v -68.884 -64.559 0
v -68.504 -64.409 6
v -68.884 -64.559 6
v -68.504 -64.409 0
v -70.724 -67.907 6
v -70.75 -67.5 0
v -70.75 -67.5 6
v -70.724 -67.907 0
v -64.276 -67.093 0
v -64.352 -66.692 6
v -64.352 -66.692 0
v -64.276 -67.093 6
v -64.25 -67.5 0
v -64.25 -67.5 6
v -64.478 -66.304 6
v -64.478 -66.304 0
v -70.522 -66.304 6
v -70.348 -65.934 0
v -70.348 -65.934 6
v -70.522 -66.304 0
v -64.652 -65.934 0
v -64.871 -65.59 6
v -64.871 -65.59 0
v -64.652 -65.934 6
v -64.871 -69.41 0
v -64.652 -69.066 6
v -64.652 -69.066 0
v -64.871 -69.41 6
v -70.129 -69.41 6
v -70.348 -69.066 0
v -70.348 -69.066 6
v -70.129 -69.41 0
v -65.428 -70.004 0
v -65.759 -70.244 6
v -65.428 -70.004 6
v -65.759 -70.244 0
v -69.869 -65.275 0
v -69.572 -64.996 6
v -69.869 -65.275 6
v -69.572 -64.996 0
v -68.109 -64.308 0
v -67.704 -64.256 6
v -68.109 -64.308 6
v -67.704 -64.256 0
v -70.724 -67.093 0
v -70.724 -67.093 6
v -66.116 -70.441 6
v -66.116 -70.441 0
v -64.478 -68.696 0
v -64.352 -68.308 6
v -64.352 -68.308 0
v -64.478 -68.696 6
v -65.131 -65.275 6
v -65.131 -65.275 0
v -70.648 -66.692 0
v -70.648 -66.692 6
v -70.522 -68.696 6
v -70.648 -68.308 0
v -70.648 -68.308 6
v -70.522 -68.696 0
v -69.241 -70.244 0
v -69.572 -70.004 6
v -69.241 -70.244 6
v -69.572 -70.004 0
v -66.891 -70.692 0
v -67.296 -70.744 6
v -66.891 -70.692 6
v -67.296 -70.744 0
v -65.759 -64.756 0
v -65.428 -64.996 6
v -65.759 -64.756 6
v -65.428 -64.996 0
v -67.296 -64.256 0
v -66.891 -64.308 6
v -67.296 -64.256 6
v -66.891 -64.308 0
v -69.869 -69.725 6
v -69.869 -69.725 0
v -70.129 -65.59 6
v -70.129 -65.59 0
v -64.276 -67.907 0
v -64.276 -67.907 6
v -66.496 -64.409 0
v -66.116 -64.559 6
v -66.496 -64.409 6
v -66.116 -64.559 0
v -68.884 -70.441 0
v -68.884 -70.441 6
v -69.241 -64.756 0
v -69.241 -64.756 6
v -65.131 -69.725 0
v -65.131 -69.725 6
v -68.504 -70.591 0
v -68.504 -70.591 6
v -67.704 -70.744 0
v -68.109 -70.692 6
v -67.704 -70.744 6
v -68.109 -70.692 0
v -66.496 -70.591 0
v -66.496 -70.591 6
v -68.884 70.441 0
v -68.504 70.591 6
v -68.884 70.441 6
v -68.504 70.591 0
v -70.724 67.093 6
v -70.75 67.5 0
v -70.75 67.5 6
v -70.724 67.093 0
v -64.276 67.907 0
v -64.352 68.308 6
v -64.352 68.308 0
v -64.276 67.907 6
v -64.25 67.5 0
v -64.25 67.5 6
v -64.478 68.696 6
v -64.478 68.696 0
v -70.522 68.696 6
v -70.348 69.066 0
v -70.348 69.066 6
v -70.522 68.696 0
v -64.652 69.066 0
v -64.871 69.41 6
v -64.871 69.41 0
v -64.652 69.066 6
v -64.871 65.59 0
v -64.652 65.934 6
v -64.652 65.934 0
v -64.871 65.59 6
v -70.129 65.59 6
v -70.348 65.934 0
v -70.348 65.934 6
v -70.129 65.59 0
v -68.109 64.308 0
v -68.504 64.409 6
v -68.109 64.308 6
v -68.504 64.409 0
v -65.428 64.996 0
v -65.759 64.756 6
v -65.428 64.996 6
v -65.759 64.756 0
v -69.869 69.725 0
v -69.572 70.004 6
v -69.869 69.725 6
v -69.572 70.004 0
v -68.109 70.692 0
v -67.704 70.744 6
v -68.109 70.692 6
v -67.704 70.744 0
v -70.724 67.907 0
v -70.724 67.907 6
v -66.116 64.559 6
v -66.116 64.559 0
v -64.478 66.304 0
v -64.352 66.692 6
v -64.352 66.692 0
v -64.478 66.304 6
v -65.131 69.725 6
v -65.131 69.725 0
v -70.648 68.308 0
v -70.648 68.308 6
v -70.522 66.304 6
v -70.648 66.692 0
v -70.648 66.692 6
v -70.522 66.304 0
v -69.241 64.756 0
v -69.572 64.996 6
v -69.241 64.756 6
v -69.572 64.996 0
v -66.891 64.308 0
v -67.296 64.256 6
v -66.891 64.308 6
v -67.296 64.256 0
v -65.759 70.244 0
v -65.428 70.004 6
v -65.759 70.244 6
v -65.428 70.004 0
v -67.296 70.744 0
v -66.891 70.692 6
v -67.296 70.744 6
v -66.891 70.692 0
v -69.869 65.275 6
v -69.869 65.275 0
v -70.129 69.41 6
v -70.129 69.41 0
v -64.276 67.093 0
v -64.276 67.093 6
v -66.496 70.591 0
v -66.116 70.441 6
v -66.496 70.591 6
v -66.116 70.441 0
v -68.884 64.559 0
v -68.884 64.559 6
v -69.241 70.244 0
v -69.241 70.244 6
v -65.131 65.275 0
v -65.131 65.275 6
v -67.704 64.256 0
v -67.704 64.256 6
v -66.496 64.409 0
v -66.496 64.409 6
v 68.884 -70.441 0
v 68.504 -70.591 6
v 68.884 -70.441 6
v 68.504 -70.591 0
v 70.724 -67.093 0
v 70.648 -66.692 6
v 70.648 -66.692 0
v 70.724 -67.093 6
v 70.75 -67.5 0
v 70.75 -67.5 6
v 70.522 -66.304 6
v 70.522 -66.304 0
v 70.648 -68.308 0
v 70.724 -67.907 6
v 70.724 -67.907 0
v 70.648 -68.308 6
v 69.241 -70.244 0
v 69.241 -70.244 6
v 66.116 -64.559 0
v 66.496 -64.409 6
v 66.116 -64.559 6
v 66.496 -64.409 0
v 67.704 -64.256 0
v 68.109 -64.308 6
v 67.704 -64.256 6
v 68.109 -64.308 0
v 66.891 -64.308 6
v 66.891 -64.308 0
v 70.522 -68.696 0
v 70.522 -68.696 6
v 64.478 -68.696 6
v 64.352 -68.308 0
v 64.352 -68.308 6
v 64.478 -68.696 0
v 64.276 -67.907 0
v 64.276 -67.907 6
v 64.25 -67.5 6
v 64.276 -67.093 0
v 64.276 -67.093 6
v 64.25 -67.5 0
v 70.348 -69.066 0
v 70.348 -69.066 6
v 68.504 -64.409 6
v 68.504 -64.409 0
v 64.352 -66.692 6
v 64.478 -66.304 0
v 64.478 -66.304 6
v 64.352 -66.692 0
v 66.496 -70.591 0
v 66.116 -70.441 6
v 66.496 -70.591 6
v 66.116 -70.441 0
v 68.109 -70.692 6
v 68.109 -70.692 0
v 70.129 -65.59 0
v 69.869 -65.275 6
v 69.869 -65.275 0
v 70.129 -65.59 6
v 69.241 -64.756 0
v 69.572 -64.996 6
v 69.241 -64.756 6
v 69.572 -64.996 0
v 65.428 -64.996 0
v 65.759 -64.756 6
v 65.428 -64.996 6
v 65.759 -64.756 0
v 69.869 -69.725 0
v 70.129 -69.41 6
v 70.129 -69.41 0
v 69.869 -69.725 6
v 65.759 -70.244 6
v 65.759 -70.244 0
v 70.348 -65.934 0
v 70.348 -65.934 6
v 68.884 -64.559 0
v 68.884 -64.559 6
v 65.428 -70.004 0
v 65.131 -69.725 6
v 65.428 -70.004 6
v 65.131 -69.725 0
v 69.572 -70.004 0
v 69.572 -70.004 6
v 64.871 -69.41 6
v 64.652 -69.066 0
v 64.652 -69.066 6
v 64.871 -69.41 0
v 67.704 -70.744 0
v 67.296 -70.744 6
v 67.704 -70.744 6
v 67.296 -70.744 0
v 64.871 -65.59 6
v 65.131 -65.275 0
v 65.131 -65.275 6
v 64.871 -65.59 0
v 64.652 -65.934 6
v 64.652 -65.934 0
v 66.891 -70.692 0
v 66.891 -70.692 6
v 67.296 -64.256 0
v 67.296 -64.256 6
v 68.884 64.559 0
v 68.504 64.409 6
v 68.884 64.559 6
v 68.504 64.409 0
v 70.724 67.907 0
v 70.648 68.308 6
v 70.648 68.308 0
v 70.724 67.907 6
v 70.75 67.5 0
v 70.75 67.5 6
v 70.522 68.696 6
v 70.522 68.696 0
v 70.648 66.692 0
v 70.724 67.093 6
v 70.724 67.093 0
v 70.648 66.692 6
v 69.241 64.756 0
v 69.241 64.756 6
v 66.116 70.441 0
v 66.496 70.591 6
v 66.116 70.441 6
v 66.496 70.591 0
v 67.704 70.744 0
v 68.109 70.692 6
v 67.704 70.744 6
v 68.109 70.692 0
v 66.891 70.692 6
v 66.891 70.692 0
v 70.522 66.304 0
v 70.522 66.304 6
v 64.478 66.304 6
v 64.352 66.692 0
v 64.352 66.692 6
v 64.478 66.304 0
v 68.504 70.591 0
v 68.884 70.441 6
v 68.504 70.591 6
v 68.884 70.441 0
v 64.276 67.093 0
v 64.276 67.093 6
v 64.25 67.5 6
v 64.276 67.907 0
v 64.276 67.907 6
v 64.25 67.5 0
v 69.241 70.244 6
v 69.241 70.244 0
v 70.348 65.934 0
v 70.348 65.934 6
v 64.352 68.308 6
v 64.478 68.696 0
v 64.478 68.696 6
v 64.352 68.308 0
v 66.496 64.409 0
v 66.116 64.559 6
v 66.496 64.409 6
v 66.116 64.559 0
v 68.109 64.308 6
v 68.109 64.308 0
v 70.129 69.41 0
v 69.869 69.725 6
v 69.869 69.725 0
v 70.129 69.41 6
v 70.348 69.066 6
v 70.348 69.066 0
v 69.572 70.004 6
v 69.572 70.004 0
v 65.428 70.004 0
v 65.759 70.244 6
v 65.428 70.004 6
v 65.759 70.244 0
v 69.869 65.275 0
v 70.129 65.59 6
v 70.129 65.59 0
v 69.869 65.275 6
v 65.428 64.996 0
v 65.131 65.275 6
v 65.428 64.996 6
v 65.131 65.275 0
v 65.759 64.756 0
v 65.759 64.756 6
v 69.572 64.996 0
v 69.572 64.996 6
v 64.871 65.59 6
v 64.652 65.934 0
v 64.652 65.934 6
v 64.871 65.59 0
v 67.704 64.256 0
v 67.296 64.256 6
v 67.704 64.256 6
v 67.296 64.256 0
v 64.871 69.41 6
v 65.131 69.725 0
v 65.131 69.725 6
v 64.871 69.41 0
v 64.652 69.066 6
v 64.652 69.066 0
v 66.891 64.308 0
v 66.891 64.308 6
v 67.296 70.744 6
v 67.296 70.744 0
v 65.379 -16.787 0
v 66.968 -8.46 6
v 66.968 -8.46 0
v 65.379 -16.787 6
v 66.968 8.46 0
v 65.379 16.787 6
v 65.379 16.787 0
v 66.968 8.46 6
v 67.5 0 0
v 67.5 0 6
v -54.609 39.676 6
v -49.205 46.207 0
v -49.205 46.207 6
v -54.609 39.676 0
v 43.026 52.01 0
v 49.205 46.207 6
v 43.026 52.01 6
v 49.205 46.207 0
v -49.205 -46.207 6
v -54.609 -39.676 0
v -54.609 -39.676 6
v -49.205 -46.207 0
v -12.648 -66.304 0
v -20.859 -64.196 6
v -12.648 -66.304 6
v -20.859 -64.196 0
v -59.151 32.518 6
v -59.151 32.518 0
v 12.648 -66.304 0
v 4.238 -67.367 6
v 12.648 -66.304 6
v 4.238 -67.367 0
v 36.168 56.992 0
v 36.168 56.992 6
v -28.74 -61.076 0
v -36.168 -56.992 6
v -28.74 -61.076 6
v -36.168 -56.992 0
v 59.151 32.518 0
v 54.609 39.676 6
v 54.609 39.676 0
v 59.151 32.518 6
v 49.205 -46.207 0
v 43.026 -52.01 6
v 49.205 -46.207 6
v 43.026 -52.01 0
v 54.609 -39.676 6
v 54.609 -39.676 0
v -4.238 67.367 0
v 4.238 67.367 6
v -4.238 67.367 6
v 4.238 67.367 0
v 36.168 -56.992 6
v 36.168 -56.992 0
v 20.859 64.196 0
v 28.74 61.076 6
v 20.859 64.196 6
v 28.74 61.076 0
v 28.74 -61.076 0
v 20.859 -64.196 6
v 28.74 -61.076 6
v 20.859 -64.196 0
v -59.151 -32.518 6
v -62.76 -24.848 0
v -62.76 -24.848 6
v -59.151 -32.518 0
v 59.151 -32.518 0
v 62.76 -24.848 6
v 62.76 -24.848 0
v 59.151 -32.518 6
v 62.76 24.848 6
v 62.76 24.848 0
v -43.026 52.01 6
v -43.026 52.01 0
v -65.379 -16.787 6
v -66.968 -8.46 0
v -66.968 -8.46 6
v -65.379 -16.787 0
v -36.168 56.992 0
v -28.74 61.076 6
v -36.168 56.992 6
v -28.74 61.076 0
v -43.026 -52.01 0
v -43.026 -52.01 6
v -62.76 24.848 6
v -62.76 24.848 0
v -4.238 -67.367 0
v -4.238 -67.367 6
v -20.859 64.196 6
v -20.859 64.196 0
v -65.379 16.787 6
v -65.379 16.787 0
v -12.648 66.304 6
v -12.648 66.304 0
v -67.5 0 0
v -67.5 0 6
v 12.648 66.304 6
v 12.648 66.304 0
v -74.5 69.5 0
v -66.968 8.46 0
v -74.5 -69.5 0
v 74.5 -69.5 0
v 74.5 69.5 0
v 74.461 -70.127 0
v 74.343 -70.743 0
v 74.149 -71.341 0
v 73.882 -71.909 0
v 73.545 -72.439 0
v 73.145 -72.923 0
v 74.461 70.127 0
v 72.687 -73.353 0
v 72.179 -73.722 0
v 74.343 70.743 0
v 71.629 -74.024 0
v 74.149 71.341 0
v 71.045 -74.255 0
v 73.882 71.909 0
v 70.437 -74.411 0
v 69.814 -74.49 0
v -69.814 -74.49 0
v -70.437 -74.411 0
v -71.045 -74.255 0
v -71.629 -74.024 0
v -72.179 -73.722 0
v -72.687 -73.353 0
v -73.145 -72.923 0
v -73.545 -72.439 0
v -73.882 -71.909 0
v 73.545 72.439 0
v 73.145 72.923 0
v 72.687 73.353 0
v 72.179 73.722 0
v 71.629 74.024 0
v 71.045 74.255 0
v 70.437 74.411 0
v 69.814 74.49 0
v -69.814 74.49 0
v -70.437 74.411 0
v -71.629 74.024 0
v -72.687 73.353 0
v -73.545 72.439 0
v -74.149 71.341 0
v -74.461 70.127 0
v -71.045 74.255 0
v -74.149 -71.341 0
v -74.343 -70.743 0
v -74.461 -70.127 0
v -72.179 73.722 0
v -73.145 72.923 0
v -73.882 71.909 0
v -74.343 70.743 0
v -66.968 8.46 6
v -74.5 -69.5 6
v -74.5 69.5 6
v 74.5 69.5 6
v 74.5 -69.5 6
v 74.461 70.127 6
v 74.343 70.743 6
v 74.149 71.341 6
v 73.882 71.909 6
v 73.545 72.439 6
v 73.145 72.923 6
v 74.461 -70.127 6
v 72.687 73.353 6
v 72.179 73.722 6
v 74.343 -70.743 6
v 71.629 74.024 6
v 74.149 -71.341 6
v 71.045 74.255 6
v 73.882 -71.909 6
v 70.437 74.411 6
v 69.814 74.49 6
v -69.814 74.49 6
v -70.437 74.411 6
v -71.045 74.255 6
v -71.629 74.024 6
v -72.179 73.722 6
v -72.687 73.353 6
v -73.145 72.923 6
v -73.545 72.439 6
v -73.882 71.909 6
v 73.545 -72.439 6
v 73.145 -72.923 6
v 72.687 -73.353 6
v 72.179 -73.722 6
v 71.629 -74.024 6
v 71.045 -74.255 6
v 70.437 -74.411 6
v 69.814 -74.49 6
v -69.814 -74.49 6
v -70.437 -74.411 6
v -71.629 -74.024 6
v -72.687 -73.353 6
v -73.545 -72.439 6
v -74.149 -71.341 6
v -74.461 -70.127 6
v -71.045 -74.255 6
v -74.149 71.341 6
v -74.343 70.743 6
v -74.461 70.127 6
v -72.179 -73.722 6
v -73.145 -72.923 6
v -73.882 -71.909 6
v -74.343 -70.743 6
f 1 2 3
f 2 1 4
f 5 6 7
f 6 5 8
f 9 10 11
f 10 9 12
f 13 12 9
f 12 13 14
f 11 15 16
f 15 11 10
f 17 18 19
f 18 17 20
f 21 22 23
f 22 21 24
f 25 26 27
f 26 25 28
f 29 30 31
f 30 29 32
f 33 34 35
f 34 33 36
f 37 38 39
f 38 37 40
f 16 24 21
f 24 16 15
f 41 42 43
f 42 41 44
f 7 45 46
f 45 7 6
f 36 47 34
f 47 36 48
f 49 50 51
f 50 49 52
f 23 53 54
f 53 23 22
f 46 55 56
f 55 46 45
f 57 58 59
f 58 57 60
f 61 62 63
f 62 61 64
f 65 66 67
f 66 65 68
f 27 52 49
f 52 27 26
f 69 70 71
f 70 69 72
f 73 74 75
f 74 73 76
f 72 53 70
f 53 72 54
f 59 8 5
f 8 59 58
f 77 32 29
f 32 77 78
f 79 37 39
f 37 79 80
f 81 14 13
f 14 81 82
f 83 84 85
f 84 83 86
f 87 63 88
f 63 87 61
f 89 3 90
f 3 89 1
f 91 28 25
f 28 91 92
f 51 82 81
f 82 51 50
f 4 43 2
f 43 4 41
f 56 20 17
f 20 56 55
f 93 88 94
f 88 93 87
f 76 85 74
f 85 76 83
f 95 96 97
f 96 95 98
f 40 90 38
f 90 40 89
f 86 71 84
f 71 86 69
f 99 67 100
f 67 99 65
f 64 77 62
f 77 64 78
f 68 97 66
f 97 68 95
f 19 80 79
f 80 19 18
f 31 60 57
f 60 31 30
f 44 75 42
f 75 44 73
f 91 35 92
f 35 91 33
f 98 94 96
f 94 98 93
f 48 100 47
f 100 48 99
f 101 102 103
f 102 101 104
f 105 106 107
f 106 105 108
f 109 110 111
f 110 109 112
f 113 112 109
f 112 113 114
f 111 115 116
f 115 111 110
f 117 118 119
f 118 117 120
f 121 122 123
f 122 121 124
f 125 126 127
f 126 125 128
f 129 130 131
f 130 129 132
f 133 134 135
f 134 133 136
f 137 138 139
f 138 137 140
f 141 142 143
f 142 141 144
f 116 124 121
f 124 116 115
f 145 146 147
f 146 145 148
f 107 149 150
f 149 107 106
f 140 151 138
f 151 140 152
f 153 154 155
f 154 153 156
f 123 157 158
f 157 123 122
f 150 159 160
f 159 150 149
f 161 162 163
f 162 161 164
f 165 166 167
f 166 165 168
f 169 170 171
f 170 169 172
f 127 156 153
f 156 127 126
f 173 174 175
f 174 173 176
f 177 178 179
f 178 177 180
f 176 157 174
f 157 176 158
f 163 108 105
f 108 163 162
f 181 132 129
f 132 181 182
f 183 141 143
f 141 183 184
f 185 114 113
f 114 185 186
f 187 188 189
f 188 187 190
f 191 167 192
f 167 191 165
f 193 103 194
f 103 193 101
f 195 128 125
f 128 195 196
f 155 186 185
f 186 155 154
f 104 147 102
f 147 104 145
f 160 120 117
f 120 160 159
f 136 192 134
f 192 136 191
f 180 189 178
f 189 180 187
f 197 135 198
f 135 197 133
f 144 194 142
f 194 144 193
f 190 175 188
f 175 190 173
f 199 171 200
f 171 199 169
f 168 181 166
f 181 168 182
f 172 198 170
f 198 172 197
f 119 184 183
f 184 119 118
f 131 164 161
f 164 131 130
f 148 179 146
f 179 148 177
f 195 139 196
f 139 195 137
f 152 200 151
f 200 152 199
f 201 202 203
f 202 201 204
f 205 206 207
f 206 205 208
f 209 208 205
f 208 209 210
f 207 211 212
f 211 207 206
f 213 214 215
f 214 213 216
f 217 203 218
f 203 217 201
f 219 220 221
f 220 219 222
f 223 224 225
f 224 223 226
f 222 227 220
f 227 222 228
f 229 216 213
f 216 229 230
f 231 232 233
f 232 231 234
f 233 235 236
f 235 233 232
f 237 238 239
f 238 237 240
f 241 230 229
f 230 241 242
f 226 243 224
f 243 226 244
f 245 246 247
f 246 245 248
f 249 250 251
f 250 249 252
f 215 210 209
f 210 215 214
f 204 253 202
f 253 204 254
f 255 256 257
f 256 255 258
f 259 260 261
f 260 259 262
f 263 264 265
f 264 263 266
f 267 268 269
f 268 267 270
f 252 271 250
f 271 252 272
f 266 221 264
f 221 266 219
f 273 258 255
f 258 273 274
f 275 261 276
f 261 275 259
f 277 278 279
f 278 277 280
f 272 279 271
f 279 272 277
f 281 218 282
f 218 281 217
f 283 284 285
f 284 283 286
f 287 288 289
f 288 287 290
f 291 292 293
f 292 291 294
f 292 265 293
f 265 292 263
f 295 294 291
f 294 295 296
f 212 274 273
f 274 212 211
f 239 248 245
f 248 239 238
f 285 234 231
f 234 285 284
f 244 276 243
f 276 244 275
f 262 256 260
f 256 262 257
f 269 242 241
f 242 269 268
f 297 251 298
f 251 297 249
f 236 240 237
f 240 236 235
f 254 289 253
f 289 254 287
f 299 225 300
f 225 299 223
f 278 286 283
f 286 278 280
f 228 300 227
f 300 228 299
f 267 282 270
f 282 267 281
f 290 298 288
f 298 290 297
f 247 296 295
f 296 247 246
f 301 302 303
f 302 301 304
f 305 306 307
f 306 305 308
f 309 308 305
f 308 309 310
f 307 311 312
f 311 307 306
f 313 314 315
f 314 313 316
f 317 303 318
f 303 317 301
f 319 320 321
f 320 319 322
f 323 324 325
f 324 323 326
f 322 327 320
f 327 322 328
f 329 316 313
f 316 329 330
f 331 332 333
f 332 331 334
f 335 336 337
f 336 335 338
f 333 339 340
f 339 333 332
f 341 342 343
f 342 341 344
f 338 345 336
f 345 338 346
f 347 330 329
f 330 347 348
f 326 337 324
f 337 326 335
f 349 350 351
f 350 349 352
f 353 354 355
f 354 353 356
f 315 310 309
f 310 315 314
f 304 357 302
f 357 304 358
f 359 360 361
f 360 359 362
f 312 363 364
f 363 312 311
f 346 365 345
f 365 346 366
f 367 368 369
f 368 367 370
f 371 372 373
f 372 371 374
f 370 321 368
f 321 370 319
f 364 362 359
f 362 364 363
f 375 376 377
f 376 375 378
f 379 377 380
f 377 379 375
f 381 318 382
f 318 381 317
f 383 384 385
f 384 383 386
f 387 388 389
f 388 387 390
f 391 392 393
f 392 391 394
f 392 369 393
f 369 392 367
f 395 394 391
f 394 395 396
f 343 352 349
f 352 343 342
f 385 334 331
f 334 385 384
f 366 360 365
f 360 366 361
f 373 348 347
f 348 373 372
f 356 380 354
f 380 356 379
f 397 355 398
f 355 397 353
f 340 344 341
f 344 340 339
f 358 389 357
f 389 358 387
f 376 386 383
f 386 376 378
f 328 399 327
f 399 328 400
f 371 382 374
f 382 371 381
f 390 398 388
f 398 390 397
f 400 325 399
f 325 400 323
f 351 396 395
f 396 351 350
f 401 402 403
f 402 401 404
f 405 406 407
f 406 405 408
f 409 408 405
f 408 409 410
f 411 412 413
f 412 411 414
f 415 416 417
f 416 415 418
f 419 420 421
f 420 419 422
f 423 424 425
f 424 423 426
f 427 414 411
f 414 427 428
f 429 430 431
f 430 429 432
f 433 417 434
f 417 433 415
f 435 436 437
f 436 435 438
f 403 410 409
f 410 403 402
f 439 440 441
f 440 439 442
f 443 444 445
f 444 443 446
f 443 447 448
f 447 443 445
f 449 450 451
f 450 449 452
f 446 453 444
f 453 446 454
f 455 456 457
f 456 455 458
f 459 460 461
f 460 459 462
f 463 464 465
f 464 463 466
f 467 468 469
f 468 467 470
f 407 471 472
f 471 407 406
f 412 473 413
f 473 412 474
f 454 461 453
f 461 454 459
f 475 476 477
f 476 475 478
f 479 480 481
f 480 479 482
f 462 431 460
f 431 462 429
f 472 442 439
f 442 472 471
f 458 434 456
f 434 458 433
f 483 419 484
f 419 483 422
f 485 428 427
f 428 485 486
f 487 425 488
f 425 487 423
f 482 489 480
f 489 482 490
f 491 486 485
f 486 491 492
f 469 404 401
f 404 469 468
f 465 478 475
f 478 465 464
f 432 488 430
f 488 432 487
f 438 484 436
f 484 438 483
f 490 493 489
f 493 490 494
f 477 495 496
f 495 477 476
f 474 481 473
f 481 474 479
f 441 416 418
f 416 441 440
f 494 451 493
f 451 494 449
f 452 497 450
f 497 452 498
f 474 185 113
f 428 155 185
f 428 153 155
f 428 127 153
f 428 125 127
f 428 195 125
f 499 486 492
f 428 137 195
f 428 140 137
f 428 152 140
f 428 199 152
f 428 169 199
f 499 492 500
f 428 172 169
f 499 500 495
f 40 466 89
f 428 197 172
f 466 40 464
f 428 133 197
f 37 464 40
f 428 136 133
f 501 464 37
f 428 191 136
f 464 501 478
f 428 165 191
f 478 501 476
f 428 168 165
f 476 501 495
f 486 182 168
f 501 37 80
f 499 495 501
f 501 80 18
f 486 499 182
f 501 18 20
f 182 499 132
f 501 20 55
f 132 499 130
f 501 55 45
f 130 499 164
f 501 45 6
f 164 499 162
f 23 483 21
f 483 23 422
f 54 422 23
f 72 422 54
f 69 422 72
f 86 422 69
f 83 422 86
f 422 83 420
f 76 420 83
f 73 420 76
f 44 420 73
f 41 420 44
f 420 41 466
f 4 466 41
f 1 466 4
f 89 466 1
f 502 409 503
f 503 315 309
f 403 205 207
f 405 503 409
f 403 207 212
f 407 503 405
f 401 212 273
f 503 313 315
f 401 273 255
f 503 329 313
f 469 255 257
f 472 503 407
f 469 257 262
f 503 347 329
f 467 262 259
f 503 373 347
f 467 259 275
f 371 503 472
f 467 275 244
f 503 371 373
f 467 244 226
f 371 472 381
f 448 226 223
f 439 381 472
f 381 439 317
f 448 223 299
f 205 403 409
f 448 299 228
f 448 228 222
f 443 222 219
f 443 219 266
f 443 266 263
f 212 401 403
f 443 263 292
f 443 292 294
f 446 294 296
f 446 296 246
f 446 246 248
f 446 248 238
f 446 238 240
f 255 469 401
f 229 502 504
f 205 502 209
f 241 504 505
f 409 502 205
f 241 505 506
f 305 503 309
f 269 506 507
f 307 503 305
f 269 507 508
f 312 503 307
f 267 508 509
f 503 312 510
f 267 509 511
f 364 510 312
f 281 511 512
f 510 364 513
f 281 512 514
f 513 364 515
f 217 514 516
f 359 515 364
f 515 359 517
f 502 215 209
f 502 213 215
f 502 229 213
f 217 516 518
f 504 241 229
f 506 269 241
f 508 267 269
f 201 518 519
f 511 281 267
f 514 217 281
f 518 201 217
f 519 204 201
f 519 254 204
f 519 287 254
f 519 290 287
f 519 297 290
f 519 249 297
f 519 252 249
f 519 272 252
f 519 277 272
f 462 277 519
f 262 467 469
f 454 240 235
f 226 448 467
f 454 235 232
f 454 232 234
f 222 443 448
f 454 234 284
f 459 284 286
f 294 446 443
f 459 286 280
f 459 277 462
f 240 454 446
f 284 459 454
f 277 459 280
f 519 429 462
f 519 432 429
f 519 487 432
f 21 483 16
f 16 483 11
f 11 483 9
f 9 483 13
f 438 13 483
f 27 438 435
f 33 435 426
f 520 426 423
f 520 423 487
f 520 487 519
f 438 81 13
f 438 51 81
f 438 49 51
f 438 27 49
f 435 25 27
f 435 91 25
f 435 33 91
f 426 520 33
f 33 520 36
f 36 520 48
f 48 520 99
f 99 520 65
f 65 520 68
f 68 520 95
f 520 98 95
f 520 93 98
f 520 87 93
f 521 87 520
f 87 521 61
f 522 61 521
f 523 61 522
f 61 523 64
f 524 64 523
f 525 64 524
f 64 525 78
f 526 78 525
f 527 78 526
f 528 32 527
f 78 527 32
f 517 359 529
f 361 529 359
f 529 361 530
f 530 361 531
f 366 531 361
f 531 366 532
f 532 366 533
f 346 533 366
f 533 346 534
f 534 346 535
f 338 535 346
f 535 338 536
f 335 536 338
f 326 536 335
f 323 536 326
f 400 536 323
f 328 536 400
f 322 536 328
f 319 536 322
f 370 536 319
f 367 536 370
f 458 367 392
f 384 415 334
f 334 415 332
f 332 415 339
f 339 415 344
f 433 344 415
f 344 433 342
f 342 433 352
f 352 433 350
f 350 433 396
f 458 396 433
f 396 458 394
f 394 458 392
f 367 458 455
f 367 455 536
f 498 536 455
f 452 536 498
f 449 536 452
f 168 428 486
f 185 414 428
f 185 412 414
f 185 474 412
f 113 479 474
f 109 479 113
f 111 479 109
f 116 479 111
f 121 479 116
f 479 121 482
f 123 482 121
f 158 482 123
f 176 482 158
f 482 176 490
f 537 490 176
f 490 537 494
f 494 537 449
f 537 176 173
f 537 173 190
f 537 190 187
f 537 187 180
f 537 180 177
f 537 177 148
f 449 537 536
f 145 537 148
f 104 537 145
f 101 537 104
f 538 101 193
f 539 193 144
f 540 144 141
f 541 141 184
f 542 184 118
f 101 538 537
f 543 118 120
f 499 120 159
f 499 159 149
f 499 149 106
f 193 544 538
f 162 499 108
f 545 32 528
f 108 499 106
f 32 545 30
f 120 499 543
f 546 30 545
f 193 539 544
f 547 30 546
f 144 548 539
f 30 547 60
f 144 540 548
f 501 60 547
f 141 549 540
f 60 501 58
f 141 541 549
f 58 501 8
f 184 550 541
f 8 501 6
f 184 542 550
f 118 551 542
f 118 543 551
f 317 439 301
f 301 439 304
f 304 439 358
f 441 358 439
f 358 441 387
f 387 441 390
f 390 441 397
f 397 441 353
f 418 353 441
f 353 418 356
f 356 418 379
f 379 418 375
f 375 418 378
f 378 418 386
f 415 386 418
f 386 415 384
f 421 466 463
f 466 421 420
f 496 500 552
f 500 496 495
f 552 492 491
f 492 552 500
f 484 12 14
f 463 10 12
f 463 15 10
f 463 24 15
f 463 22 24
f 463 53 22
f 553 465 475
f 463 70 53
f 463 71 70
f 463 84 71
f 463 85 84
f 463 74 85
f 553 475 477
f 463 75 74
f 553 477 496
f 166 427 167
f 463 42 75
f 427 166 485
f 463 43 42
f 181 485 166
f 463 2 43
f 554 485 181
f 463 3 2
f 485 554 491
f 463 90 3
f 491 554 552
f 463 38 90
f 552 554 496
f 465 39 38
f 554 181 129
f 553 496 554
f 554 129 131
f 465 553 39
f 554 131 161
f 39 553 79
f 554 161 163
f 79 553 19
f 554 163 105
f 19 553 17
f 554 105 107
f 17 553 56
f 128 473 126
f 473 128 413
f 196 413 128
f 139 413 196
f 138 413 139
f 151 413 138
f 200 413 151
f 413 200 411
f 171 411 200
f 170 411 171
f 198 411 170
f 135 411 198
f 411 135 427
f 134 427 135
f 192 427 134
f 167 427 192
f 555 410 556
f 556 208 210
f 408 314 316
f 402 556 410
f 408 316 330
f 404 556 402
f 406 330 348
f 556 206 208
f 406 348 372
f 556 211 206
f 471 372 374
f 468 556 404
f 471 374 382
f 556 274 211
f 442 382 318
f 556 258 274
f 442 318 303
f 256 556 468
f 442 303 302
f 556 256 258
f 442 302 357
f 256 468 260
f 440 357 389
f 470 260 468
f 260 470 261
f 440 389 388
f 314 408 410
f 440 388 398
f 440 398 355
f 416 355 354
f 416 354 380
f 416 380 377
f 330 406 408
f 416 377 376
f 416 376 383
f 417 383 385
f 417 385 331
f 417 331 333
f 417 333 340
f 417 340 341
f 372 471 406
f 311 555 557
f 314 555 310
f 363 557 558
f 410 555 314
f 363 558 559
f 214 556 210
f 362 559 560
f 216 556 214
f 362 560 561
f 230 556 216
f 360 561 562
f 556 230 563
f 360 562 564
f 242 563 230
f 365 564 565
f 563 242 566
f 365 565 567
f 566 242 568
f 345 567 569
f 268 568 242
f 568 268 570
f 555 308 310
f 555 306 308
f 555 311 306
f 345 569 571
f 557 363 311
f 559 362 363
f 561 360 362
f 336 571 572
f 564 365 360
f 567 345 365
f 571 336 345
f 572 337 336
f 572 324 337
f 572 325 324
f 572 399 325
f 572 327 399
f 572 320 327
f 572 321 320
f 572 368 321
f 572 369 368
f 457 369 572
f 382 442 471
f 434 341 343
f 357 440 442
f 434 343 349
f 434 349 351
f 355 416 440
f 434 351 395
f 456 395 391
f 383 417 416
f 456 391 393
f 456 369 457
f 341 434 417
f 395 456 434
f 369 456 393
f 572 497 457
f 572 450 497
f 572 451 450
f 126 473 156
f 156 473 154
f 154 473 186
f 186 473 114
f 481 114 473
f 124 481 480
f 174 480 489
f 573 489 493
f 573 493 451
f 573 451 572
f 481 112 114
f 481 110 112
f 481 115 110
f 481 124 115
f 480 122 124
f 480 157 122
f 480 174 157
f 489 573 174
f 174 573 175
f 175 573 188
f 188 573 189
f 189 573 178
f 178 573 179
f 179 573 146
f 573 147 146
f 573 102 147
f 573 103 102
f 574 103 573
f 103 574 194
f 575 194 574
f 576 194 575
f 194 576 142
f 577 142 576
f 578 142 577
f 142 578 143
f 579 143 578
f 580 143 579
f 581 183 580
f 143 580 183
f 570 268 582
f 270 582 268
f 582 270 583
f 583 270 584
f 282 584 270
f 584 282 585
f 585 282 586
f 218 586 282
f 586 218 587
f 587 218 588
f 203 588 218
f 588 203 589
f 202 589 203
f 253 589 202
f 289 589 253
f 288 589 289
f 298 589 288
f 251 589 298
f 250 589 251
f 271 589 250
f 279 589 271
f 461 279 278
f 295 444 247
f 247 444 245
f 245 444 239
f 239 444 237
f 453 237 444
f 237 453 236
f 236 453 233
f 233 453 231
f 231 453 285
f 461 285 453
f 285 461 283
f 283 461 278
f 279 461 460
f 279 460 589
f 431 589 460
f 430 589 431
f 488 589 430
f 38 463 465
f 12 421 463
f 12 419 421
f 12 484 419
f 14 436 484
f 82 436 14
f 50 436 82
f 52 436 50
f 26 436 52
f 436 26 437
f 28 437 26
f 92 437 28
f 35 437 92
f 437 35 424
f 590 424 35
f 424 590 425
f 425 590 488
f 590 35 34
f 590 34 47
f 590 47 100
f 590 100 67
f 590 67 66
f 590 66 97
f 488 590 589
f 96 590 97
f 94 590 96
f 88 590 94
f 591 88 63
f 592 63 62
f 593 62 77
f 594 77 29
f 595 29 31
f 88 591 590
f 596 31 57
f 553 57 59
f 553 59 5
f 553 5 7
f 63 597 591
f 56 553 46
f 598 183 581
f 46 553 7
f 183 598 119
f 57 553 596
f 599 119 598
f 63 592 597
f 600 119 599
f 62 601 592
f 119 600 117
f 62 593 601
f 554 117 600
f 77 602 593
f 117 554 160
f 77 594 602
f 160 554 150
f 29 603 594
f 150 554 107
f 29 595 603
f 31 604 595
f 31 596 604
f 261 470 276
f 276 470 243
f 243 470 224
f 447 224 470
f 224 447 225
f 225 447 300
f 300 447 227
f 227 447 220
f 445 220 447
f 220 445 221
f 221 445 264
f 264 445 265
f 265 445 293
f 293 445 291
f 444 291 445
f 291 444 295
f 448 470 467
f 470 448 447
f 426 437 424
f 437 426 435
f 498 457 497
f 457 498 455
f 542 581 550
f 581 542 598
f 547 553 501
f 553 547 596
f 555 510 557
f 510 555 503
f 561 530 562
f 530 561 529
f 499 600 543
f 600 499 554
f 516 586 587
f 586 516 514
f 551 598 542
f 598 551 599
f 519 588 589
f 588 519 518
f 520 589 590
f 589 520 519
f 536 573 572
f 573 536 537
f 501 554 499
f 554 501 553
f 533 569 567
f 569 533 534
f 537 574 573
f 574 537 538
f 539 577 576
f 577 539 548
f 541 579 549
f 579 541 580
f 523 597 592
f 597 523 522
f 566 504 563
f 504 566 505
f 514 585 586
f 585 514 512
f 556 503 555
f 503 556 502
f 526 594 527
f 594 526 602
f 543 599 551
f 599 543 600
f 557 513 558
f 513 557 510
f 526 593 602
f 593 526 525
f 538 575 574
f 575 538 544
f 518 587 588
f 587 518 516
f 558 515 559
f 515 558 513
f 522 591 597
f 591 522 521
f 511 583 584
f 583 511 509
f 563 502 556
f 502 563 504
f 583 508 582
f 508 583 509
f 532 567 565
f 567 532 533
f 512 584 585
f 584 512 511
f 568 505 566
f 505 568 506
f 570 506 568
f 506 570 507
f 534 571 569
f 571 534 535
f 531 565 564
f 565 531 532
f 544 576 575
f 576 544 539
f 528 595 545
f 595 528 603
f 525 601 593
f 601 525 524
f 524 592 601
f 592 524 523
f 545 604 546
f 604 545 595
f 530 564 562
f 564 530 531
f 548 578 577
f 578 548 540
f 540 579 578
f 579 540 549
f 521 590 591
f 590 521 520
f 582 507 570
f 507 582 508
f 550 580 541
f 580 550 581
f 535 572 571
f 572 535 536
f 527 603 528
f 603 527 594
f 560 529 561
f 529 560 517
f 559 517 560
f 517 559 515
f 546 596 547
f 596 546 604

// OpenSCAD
$fn = 50;

difference() {
	union() {
		hull() {
			translate(v = [-69.5, 69.5, 0]) {
				cylinder(h = 6, r = 5);
			}
			translate(v = [69.5, 69.5, 0]) {
				cylinder(h = 6, r = 5);
			}
			translate(v = [-69.5, -69.5, 0]) {
				cylinder(h = 6, r = 5);
			}
			translate(v = [69.5, -69.5, 0]) {
				cylinder(h = 6, r = 5);
			}
		}
	}
	union() {
		translate(v = [-67.5, -67.5, -100.0]) {
			cylinder(h = 200, r = 3.25);
		}
		translate(v = [-67.5, 67.5, -100.0]) {
			cylinder(h = 200, r = 3.25);
		}
		translate(v = [67.5, -67.5, -100.0]) {
			cylinder(h = 200, r = 3.25);
		}
		translate(v = [67.5, 67.5, -100.0]) {
			cylinder(h = 200, r = 3.25);
		}
		translate(v = [-67.5, -67.5, -100.0]) {
			cylinder(h = 200, r = 1.8);
		}
		translate(v = [-67.5, 67.5, -100.0]) {
			cylinder(h = 200, r = 1.8);
		}
		translate(v = [67.5, -67.5, -100.0]) {
			cylinder(h = 200, r = 1.8);
		}
		translate(v = [67.5, 67.5, -100.0]) {
			cylinder(h = 200, r = 1.8);
		}
		cylinder(h = 6, r = 67.5);
	}
}
